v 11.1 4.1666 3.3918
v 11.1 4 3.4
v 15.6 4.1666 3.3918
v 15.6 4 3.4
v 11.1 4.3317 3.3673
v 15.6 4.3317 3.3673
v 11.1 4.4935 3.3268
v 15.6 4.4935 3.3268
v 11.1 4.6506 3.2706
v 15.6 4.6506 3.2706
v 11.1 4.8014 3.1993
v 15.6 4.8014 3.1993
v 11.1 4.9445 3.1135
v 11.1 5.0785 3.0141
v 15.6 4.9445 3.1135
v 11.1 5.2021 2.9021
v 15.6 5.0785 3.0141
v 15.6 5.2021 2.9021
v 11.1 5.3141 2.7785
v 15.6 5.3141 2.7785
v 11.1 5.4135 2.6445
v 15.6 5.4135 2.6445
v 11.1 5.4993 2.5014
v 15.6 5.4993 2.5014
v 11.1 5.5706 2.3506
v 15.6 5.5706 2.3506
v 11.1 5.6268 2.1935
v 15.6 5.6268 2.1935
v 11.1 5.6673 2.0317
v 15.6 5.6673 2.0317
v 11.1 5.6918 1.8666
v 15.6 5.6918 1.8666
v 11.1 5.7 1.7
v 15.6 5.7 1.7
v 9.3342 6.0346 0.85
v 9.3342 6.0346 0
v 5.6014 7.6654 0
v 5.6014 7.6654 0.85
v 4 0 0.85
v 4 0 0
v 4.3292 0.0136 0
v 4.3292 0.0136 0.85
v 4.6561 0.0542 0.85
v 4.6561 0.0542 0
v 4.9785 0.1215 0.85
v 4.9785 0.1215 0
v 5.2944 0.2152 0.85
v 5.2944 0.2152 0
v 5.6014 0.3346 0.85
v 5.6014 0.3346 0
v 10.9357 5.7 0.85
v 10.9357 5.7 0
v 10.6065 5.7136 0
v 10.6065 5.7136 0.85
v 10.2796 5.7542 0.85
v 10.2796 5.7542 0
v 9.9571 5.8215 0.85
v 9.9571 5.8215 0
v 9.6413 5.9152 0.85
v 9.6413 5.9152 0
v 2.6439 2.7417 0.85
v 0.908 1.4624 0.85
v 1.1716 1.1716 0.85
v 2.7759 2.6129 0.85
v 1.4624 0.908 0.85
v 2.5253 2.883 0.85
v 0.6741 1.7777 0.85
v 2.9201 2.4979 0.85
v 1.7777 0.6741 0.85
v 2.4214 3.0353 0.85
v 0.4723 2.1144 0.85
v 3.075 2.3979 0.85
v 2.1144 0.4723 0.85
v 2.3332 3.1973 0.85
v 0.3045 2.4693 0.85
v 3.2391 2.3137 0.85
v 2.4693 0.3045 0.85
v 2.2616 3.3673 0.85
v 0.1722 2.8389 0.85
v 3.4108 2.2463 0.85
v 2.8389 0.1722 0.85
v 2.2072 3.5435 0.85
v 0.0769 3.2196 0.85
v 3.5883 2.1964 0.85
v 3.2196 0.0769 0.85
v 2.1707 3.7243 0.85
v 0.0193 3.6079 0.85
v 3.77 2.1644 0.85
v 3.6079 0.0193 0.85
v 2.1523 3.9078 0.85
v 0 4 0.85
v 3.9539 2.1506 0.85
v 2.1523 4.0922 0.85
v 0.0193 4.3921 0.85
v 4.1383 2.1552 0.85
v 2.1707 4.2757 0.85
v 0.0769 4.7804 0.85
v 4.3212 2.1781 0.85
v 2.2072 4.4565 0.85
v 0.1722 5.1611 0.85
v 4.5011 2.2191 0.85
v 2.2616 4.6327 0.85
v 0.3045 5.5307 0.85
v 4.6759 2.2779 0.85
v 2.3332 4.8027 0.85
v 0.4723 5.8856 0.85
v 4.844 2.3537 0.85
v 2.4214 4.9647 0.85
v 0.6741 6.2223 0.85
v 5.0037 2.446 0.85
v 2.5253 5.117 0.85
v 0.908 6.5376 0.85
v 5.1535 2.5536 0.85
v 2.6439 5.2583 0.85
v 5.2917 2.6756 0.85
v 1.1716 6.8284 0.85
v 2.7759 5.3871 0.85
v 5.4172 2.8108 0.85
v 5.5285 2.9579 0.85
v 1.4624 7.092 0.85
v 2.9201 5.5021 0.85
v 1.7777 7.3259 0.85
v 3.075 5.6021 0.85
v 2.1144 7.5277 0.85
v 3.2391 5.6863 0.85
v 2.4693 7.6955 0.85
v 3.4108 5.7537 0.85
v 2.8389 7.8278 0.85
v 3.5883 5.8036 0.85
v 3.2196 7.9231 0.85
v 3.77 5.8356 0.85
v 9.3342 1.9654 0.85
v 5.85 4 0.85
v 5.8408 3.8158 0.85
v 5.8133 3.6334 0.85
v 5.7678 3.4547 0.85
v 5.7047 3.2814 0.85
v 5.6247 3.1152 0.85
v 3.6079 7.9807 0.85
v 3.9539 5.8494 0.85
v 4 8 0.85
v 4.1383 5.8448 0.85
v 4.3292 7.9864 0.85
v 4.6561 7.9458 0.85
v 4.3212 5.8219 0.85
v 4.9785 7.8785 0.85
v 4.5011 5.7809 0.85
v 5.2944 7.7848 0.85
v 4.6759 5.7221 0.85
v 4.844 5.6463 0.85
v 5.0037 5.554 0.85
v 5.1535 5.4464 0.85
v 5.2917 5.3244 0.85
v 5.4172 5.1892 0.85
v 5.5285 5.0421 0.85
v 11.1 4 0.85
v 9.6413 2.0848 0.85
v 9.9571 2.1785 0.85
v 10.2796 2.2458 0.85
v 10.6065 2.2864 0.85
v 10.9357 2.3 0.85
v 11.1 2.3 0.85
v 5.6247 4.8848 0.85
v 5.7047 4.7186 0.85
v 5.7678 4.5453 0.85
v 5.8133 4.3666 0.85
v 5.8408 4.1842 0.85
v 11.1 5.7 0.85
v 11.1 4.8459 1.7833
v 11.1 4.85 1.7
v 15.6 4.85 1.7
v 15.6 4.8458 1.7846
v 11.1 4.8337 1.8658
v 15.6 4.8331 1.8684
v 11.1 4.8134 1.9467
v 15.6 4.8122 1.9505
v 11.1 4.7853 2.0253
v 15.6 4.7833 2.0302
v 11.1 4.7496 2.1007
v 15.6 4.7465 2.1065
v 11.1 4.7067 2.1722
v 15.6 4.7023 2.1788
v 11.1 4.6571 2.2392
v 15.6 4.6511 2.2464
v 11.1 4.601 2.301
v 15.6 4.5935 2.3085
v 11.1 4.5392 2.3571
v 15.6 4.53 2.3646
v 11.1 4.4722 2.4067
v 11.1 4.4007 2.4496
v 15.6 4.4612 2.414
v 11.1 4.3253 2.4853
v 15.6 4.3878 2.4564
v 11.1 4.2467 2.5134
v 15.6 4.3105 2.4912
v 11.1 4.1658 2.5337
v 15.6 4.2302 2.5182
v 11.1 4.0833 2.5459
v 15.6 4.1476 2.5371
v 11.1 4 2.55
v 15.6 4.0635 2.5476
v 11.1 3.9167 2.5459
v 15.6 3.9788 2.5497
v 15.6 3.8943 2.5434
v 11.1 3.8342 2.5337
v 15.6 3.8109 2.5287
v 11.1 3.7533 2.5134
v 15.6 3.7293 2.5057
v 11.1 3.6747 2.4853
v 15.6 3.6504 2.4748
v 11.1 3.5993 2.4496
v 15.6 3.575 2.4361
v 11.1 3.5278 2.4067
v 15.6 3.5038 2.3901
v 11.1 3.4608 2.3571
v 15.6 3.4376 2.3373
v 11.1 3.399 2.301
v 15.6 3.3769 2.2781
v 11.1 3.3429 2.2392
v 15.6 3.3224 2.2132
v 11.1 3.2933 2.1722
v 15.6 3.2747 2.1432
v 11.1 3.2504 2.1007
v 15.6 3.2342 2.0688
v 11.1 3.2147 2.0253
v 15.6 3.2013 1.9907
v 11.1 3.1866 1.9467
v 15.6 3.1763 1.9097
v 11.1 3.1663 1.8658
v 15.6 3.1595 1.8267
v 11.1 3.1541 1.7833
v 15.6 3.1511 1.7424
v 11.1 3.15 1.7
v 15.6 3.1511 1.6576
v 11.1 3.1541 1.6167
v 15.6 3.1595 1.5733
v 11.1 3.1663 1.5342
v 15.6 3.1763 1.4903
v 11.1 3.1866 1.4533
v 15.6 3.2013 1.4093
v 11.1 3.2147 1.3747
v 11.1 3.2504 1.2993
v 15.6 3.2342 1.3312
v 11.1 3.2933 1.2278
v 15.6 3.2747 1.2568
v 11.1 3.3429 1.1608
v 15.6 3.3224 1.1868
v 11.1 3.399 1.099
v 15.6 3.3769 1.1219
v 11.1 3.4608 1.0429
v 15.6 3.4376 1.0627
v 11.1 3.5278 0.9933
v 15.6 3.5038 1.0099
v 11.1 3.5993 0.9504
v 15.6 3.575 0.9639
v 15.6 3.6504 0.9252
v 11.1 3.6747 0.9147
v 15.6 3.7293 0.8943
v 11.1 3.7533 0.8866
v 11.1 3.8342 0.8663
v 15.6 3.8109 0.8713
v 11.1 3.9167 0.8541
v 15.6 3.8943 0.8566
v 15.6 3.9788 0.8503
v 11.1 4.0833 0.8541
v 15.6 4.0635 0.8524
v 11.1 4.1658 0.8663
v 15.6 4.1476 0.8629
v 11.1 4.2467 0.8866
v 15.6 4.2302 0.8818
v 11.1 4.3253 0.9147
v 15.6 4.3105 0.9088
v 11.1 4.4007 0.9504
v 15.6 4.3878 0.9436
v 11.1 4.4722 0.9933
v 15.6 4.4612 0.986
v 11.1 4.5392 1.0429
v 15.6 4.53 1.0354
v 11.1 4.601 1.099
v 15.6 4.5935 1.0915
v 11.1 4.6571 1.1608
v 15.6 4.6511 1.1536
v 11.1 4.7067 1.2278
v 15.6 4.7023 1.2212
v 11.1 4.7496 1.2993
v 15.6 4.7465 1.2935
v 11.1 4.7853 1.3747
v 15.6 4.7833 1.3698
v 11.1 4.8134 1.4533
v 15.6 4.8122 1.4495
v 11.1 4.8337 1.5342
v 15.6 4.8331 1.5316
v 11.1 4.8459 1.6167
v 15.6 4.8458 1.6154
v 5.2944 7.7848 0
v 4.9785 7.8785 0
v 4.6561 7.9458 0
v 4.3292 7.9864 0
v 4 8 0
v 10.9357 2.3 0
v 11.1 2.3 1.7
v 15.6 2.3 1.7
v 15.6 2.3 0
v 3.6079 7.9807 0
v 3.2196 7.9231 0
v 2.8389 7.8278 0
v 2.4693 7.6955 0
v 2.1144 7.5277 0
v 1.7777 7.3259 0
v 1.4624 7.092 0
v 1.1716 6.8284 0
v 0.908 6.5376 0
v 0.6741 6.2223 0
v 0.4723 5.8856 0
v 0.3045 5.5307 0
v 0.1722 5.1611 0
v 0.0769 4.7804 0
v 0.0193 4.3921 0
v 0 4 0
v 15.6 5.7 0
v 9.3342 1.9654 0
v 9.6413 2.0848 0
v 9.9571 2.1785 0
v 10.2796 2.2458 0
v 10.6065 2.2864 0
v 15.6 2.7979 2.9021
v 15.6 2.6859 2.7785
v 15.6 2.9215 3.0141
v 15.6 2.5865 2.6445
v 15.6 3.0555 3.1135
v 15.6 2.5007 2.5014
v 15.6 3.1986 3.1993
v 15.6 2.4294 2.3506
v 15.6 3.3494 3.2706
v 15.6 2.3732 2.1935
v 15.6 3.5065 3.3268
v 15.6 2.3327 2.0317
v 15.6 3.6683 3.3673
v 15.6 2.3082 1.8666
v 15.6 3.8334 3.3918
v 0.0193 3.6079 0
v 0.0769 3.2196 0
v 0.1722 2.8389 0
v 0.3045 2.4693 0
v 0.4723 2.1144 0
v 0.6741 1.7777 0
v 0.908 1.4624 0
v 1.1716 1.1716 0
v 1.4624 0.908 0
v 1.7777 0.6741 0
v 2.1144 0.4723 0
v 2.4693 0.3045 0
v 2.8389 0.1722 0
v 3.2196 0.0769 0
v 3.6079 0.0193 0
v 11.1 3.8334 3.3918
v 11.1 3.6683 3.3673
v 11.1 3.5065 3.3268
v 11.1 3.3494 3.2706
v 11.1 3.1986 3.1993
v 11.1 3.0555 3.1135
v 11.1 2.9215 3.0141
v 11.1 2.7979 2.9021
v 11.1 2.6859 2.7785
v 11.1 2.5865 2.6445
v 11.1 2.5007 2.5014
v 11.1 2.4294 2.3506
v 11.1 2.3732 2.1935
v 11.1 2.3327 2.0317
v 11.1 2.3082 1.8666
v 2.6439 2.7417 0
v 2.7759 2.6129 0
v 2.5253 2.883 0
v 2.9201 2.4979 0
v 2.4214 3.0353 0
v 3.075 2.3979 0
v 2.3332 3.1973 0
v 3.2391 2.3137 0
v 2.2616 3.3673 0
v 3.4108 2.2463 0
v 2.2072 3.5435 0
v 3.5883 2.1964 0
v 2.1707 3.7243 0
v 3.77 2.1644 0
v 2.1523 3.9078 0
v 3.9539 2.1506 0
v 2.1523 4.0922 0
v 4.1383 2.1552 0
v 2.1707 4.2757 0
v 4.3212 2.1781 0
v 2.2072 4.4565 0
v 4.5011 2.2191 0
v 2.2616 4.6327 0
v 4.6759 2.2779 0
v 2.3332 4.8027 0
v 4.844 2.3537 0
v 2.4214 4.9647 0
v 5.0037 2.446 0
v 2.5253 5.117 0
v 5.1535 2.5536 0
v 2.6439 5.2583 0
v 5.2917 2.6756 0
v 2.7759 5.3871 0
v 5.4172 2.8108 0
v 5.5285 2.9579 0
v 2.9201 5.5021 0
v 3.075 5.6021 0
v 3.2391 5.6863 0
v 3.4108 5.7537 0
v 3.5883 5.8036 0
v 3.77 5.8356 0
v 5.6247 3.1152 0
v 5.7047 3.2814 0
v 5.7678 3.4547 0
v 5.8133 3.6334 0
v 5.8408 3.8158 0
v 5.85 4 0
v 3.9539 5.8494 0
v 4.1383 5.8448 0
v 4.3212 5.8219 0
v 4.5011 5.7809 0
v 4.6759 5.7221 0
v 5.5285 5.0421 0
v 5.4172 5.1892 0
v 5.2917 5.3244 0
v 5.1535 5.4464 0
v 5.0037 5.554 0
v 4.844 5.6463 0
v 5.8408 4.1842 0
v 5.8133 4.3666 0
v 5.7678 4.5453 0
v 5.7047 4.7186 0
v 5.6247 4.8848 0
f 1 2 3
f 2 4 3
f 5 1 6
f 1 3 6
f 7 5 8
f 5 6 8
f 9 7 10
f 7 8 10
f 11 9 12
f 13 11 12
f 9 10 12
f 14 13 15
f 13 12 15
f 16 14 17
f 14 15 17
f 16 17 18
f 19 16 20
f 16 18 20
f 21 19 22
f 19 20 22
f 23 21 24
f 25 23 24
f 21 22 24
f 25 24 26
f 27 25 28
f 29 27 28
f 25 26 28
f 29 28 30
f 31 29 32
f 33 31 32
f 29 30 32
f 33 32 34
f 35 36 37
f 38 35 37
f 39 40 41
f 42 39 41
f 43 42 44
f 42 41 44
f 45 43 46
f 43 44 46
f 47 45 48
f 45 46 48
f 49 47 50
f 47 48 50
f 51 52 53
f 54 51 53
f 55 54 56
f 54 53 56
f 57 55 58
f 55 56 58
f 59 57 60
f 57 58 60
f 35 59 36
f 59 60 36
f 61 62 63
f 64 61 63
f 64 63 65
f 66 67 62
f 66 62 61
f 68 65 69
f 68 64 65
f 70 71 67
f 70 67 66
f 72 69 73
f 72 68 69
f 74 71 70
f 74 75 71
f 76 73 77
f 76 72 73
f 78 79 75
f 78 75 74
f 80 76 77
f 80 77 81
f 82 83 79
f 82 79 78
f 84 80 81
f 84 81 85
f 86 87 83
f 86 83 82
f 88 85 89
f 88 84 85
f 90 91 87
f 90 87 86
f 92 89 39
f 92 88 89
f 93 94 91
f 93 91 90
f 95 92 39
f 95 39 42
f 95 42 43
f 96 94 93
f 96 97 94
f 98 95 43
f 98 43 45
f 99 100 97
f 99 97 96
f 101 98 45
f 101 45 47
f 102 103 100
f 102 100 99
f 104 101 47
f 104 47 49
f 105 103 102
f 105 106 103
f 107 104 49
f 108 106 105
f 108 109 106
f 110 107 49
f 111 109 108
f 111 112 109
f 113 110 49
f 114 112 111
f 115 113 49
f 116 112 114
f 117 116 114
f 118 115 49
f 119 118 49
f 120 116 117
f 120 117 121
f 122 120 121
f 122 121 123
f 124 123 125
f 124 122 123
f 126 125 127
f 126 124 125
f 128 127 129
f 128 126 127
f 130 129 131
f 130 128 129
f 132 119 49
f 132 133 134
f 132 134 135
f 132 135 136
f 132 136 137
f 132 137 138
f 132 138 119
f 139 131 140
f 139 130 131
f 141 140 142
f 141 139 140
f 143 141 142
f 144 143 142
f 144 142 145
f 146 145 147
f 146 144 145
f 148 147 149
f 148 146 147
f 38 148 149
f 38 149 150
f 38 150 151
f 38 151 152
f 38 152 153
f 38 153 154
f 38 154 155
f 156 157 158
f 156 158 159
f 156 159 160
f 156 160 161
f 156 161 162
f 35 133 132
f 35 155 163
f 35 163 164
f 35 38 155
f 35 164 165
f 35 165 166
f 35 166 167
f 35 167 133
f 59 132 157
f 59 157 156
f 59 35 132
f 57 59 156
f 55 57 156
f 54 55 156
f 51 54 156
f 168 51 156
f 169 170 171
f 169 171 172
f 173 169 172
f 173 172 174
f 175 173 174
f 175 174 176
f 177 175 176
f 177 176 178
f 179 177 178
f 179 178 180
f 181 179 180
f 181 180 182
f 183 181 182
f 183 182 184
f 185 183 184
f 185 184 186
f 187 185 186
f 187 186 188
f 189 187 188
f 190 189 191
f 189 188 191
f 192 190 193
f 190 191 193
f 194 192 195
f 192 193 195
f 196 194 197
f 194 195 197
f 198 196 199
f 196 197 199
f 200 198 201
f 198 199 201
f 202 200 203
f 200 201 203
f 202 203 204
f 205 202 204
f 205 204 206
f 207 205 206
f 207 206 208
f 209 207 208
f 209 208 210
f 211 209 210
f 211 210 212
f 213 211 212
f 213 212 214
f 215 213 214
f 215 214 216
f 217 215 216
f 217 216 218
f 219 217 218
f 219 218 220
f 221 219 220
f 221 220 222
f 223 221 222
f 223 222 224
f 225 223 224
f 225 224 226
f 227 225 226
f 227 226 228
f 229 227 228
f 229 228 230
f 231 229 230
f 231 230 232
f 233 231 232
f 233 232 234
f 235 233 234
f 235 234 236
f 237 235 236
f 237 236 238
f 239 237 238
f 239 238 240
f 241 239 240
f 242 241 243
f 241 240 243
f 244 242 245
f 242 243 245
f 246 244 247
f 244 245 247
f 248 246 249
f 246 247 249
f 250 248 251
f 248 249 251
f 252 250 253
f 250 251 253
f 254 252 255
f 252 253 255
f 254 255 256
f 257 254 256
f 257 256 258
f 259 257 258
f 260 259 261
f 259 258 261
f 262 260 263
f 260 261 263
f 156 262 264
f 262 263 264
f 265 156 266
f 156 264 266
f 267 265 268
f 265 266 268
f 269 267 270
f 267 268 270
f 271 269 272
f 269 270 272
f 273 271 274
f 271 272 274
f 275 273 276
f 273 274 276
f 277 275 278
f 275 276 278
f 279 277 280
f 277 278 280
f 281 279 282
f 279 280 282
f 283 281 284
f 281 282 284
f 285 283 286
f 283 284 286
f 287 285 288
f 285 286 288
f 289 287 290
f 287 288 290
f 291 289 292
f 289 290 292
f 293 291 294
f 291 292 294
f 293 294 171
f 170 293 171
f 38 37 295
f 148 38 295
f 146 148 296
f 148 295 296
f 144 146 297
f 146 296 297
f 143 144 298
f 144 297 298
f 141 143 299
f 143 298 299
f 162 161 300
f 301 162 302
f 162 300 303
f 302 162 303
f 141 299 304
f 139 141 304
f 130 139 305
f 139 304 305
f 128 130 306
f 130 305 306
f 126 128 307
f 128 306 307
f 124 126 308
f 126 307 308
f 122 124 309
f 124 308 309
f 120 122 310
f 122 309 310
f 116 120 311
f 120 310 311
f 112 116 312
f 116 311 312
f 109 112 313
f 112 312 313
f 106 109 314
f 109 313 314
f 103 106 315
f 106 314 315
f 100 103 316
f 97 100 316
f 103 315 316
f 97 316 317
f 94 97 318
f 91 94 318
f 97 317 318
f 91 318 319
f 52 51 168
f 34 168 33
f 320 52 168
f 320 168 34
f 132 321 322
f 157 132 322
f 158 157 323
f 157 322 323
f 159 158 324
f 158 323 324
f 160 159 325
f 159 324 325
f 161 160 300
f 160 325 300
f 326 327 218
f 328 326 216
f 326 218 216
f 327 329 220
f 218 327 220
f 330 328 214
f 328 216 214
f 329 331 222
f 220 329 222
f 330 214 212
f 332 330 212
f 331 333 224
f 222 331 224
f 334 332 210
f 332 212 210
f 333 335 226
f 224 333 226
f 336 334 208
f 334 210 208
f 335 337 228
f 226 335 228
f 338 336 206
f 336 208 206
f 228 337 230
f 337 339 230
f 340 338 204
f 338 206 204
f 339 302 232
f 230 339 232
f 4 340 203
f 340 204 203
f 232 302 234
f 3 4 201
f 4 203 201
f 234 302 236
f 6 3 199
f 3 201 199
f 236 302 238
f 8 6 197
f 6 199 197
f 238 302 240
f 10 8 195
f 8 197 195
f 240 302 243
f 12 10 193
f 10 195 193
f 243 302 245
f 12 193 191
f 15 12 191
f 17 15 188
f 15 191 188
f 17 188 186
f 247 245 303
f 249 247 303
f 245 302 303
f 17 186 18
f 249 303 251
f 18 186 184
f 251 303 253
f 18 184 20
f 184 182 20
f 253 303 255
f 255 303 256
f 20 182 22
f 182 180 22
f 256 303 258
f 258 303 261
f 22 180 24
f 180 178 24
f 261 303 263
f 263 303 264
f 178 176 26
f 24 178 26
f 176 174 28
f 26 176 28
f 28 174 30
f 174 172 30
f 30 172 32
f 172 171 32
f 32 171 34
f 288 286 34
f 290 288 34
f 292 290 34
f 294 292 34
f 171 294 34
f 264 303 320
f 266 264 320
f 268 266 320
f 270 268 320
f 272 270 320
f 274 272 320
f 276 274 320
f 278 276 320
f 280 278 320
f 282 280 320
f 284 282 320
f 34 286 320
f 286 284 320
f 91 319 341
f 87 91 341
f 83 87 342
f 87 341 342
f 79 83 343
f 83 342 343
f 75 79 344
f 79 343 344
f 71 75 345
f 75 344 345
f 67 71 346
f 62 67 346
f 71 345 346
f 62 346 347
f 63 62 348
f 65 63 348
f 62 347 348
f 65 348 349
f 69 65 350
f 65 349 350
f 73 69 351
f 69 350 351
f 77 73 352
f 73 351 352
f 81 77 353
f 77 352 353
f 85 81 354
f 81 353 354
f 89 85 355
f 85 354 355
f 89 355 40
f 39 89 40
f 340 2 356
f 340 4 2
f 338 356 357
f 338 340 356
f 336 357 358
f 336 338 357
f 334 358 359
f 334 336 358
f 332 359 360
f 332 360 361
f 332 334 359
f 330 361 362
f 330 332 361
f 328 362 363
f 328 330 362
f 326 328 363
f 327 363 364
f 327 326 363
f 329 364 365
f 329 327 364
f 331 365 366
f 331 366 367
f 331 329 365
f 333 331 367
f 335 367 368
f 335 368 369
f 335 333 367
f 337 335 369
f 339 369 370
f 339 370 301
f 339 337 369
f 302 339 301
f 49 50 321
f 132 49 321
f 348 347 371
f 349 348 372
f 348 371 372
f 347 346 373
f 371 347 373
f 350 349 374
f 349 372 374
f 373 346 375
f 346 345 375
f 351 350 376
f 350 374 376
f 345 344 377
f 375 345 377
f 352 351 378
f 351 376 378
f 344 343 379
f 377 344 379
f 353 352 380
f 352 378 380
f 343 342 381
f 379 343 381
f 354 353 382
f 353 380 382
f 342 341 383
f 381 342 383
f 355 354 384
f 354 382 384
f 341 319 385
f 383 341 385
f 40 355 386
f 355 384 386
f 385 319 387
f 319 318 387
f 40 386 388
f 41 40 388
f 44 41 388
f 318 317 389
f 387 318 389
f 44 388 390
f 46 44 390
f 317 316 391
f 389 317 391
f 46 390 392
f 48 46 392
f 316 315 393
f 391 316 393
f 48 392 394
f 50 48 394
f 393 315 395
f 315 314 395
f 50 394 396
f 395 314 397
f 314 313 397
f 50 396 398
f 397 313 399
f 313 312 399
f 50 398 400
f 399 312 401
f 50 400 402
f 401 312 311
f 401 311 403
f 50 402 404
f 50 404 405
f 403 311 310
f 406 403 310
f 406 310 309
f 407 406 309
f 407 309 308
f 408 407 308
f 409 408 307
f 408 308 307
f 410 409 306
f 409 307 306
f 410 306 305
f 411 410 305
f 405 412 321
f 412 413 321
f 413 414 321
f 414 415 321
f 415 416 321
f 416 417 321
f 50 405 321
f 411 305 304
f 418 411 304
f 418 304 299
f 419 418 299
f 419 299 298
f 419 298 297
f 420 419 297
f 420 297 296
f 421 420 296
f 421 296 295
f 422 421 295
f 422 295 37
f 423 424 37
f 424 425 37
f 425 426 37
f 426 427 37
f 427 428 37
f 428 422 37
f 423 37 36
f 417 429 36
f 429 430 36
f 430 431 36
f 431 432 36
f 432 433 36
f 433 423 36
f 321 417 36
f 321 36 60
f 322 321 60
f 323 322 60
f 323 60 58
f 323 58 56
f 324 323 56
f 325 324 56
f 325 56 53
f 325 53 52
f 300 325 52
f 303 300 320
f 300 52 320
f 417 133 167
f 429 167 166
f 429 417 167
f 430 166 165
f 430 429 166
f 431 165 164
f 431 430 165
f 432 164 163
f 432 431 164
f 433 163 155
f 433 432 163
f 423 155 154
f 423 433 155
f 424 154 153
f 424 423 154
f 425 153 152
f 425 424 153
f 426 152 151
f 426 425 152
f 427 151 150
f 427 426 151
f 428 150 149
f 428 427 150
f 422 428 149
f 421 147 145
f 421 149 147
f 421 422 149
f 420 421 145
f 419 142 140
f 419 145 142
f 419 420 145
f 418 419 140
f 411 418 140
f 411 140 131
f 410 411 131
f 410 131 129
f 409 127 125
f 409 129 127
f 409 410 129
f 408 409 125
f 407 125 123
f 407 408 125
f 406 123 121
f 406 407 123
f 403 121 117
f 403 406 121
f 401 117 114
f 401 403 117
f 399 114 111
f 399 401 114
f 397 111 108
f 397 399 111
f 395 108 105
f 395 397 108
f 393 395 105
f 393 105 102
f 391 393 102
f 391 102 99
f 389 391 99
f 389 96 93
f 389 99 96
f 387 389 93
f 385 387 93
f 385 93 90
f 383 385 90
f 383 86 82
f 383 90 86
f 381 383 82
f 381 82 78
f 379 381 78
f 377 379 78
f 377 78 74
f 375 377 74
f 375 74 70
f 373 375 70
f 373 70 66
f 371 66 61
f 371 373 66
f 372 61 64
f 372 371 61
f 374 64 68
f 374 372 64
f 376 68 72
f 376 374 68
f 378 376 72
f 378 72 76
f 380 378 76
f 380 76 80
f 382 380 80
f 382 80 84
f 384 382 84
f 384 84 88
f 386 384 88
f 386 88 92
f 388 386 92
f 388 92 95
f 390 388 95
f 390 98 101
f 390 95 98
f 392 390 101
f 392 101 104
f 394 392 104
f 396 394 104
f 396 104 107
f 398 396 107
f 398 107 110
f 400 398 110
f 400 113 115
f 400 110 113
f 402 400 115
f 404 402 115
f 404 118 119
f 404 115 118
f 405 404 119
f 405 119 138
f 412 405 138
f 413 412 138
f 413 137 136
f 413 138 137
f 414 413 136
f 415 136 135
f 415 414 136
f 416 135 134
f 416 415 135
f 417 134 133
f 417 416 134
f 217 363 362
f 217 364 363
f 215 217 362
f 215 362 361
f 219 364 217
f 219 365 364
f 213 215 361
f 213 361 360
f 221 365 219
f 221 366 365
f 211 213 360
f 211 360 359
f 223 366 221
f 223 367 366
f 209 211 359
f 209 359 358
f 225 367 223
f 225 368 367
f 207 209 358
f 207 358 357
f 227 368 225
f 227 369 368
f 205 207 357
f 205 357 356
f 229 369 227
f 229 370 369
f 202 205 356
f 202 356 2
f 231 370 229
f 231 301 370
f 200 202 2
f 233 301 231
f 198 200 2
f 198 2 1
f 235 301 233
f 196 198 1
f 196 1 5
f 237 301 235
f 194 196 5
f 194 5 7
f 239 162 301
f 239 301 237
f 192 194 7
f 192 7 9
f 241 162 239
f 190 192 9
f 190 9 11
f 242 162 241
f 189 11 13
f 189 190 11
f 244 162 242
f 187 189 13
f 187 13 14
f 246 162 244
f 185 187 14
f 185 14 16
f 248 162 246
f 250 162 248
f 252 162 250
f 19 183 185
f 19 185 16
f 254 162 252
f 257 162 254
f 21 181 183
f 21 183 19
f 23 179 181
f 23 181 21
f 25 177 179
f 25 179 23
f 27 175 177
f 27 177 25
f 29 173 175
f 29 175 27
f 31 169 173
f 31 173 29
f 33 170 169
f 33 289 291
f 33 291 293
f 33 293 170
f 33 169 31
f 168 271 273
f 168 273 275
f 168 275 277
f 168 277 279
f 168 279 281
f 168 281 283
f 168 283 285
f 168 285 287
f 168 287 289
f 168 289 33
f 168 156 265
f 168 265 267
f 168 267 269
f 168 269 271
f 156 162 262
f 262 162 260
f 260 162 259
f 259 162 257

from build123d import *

# Parameters (mm, degrees)
F0_R     = 1.85
F1_DEPTH = 0.85
F2_W     = 4.5
F2_H     = 3.4
F3_DEPTH = 2.55
F4_R     = 1.69999
F5_R     = 0.85
F6_DEPTH = 25


# Not quite as in the source:
# - a fillet or chamfer is up to 0.001 mm smaller than in the source, because OpenCascade refuses the exact size


with BuildPart() as f1:
    # F0 (on Top) → F1 (new body)
    with BuildSketch(Plane.XY):
        with BuildLine():
            Line((10.9356666081, 2.3), (15.6, 2.3))
            Line((15.6, 2.3), (15.6, 5.7))
            Line((15.6, 5.7), (10.9356666081, 5.7))
            ThreePointArc((10.9356666081, 5.7), (10.117660762, 5.7845349656), (9.3342299639, 6.0345667821))
            Line((9.3342299639, 6.0345667821), (5.6014366442, 7.6654332179))
            ThreePointArc((5.6014366442, 7.6654332179), (4.8180058461, 7.9154650344), (4, 8))
            ThreePointArc((4, 8), (1.1715728753, 6.8284271247), (0, 4))
            ThreePointArc((0, 4), (1.1715728753, 1.1715728753), (4, 0))
            ThreePointArc((4, 0), (4.8180058461, 0.0845349656), (5.6014366442, 0.3345667821))
            Line((5.6014366442, 0.3345667821), (9.3342299639, 1.9654332179))
            ThreePointArc((9.3342299639, 1.9654332179), (10.117660762, 2.2154650344), (10.9356666081, 2.3))
        make_face()
        with Locations((4, 4)):
            Circle(F0_R, mode=Mode.SUBTRACT)
    extrude(amount=F1_DEPTH)

    # F2 (on face) → F3 (join)
    with BuildSketch(Plane.XY.offset(0.85)):
        with Locations((13.35, 4)):
            Rectangle(F2_W, F2_H)
    extrude(amount=F3_DEPTH)

    # F4 (radius 1.7 in the source; OpenCascade refuses exactly that, so slightly less here)
    f4_edges = [f1.edges().sort_by_distance(p)[0] for p in [
        (13.35, 5.7, 3.4),
        (13.35, 2.3, 3.4),
    ]]
    fillet(f4_edges, radius=F4_R)

    # F5 (on face) → F6 (cut)
    with BuildSketch(Plane.YZ.offset(15.6)):
        with Locations((4, 1.7)):
            Circle(F5_R)
    extrude(amount=-F6_DEPTH, mode=Mode.SUBTRACT)


solid = f1.part
